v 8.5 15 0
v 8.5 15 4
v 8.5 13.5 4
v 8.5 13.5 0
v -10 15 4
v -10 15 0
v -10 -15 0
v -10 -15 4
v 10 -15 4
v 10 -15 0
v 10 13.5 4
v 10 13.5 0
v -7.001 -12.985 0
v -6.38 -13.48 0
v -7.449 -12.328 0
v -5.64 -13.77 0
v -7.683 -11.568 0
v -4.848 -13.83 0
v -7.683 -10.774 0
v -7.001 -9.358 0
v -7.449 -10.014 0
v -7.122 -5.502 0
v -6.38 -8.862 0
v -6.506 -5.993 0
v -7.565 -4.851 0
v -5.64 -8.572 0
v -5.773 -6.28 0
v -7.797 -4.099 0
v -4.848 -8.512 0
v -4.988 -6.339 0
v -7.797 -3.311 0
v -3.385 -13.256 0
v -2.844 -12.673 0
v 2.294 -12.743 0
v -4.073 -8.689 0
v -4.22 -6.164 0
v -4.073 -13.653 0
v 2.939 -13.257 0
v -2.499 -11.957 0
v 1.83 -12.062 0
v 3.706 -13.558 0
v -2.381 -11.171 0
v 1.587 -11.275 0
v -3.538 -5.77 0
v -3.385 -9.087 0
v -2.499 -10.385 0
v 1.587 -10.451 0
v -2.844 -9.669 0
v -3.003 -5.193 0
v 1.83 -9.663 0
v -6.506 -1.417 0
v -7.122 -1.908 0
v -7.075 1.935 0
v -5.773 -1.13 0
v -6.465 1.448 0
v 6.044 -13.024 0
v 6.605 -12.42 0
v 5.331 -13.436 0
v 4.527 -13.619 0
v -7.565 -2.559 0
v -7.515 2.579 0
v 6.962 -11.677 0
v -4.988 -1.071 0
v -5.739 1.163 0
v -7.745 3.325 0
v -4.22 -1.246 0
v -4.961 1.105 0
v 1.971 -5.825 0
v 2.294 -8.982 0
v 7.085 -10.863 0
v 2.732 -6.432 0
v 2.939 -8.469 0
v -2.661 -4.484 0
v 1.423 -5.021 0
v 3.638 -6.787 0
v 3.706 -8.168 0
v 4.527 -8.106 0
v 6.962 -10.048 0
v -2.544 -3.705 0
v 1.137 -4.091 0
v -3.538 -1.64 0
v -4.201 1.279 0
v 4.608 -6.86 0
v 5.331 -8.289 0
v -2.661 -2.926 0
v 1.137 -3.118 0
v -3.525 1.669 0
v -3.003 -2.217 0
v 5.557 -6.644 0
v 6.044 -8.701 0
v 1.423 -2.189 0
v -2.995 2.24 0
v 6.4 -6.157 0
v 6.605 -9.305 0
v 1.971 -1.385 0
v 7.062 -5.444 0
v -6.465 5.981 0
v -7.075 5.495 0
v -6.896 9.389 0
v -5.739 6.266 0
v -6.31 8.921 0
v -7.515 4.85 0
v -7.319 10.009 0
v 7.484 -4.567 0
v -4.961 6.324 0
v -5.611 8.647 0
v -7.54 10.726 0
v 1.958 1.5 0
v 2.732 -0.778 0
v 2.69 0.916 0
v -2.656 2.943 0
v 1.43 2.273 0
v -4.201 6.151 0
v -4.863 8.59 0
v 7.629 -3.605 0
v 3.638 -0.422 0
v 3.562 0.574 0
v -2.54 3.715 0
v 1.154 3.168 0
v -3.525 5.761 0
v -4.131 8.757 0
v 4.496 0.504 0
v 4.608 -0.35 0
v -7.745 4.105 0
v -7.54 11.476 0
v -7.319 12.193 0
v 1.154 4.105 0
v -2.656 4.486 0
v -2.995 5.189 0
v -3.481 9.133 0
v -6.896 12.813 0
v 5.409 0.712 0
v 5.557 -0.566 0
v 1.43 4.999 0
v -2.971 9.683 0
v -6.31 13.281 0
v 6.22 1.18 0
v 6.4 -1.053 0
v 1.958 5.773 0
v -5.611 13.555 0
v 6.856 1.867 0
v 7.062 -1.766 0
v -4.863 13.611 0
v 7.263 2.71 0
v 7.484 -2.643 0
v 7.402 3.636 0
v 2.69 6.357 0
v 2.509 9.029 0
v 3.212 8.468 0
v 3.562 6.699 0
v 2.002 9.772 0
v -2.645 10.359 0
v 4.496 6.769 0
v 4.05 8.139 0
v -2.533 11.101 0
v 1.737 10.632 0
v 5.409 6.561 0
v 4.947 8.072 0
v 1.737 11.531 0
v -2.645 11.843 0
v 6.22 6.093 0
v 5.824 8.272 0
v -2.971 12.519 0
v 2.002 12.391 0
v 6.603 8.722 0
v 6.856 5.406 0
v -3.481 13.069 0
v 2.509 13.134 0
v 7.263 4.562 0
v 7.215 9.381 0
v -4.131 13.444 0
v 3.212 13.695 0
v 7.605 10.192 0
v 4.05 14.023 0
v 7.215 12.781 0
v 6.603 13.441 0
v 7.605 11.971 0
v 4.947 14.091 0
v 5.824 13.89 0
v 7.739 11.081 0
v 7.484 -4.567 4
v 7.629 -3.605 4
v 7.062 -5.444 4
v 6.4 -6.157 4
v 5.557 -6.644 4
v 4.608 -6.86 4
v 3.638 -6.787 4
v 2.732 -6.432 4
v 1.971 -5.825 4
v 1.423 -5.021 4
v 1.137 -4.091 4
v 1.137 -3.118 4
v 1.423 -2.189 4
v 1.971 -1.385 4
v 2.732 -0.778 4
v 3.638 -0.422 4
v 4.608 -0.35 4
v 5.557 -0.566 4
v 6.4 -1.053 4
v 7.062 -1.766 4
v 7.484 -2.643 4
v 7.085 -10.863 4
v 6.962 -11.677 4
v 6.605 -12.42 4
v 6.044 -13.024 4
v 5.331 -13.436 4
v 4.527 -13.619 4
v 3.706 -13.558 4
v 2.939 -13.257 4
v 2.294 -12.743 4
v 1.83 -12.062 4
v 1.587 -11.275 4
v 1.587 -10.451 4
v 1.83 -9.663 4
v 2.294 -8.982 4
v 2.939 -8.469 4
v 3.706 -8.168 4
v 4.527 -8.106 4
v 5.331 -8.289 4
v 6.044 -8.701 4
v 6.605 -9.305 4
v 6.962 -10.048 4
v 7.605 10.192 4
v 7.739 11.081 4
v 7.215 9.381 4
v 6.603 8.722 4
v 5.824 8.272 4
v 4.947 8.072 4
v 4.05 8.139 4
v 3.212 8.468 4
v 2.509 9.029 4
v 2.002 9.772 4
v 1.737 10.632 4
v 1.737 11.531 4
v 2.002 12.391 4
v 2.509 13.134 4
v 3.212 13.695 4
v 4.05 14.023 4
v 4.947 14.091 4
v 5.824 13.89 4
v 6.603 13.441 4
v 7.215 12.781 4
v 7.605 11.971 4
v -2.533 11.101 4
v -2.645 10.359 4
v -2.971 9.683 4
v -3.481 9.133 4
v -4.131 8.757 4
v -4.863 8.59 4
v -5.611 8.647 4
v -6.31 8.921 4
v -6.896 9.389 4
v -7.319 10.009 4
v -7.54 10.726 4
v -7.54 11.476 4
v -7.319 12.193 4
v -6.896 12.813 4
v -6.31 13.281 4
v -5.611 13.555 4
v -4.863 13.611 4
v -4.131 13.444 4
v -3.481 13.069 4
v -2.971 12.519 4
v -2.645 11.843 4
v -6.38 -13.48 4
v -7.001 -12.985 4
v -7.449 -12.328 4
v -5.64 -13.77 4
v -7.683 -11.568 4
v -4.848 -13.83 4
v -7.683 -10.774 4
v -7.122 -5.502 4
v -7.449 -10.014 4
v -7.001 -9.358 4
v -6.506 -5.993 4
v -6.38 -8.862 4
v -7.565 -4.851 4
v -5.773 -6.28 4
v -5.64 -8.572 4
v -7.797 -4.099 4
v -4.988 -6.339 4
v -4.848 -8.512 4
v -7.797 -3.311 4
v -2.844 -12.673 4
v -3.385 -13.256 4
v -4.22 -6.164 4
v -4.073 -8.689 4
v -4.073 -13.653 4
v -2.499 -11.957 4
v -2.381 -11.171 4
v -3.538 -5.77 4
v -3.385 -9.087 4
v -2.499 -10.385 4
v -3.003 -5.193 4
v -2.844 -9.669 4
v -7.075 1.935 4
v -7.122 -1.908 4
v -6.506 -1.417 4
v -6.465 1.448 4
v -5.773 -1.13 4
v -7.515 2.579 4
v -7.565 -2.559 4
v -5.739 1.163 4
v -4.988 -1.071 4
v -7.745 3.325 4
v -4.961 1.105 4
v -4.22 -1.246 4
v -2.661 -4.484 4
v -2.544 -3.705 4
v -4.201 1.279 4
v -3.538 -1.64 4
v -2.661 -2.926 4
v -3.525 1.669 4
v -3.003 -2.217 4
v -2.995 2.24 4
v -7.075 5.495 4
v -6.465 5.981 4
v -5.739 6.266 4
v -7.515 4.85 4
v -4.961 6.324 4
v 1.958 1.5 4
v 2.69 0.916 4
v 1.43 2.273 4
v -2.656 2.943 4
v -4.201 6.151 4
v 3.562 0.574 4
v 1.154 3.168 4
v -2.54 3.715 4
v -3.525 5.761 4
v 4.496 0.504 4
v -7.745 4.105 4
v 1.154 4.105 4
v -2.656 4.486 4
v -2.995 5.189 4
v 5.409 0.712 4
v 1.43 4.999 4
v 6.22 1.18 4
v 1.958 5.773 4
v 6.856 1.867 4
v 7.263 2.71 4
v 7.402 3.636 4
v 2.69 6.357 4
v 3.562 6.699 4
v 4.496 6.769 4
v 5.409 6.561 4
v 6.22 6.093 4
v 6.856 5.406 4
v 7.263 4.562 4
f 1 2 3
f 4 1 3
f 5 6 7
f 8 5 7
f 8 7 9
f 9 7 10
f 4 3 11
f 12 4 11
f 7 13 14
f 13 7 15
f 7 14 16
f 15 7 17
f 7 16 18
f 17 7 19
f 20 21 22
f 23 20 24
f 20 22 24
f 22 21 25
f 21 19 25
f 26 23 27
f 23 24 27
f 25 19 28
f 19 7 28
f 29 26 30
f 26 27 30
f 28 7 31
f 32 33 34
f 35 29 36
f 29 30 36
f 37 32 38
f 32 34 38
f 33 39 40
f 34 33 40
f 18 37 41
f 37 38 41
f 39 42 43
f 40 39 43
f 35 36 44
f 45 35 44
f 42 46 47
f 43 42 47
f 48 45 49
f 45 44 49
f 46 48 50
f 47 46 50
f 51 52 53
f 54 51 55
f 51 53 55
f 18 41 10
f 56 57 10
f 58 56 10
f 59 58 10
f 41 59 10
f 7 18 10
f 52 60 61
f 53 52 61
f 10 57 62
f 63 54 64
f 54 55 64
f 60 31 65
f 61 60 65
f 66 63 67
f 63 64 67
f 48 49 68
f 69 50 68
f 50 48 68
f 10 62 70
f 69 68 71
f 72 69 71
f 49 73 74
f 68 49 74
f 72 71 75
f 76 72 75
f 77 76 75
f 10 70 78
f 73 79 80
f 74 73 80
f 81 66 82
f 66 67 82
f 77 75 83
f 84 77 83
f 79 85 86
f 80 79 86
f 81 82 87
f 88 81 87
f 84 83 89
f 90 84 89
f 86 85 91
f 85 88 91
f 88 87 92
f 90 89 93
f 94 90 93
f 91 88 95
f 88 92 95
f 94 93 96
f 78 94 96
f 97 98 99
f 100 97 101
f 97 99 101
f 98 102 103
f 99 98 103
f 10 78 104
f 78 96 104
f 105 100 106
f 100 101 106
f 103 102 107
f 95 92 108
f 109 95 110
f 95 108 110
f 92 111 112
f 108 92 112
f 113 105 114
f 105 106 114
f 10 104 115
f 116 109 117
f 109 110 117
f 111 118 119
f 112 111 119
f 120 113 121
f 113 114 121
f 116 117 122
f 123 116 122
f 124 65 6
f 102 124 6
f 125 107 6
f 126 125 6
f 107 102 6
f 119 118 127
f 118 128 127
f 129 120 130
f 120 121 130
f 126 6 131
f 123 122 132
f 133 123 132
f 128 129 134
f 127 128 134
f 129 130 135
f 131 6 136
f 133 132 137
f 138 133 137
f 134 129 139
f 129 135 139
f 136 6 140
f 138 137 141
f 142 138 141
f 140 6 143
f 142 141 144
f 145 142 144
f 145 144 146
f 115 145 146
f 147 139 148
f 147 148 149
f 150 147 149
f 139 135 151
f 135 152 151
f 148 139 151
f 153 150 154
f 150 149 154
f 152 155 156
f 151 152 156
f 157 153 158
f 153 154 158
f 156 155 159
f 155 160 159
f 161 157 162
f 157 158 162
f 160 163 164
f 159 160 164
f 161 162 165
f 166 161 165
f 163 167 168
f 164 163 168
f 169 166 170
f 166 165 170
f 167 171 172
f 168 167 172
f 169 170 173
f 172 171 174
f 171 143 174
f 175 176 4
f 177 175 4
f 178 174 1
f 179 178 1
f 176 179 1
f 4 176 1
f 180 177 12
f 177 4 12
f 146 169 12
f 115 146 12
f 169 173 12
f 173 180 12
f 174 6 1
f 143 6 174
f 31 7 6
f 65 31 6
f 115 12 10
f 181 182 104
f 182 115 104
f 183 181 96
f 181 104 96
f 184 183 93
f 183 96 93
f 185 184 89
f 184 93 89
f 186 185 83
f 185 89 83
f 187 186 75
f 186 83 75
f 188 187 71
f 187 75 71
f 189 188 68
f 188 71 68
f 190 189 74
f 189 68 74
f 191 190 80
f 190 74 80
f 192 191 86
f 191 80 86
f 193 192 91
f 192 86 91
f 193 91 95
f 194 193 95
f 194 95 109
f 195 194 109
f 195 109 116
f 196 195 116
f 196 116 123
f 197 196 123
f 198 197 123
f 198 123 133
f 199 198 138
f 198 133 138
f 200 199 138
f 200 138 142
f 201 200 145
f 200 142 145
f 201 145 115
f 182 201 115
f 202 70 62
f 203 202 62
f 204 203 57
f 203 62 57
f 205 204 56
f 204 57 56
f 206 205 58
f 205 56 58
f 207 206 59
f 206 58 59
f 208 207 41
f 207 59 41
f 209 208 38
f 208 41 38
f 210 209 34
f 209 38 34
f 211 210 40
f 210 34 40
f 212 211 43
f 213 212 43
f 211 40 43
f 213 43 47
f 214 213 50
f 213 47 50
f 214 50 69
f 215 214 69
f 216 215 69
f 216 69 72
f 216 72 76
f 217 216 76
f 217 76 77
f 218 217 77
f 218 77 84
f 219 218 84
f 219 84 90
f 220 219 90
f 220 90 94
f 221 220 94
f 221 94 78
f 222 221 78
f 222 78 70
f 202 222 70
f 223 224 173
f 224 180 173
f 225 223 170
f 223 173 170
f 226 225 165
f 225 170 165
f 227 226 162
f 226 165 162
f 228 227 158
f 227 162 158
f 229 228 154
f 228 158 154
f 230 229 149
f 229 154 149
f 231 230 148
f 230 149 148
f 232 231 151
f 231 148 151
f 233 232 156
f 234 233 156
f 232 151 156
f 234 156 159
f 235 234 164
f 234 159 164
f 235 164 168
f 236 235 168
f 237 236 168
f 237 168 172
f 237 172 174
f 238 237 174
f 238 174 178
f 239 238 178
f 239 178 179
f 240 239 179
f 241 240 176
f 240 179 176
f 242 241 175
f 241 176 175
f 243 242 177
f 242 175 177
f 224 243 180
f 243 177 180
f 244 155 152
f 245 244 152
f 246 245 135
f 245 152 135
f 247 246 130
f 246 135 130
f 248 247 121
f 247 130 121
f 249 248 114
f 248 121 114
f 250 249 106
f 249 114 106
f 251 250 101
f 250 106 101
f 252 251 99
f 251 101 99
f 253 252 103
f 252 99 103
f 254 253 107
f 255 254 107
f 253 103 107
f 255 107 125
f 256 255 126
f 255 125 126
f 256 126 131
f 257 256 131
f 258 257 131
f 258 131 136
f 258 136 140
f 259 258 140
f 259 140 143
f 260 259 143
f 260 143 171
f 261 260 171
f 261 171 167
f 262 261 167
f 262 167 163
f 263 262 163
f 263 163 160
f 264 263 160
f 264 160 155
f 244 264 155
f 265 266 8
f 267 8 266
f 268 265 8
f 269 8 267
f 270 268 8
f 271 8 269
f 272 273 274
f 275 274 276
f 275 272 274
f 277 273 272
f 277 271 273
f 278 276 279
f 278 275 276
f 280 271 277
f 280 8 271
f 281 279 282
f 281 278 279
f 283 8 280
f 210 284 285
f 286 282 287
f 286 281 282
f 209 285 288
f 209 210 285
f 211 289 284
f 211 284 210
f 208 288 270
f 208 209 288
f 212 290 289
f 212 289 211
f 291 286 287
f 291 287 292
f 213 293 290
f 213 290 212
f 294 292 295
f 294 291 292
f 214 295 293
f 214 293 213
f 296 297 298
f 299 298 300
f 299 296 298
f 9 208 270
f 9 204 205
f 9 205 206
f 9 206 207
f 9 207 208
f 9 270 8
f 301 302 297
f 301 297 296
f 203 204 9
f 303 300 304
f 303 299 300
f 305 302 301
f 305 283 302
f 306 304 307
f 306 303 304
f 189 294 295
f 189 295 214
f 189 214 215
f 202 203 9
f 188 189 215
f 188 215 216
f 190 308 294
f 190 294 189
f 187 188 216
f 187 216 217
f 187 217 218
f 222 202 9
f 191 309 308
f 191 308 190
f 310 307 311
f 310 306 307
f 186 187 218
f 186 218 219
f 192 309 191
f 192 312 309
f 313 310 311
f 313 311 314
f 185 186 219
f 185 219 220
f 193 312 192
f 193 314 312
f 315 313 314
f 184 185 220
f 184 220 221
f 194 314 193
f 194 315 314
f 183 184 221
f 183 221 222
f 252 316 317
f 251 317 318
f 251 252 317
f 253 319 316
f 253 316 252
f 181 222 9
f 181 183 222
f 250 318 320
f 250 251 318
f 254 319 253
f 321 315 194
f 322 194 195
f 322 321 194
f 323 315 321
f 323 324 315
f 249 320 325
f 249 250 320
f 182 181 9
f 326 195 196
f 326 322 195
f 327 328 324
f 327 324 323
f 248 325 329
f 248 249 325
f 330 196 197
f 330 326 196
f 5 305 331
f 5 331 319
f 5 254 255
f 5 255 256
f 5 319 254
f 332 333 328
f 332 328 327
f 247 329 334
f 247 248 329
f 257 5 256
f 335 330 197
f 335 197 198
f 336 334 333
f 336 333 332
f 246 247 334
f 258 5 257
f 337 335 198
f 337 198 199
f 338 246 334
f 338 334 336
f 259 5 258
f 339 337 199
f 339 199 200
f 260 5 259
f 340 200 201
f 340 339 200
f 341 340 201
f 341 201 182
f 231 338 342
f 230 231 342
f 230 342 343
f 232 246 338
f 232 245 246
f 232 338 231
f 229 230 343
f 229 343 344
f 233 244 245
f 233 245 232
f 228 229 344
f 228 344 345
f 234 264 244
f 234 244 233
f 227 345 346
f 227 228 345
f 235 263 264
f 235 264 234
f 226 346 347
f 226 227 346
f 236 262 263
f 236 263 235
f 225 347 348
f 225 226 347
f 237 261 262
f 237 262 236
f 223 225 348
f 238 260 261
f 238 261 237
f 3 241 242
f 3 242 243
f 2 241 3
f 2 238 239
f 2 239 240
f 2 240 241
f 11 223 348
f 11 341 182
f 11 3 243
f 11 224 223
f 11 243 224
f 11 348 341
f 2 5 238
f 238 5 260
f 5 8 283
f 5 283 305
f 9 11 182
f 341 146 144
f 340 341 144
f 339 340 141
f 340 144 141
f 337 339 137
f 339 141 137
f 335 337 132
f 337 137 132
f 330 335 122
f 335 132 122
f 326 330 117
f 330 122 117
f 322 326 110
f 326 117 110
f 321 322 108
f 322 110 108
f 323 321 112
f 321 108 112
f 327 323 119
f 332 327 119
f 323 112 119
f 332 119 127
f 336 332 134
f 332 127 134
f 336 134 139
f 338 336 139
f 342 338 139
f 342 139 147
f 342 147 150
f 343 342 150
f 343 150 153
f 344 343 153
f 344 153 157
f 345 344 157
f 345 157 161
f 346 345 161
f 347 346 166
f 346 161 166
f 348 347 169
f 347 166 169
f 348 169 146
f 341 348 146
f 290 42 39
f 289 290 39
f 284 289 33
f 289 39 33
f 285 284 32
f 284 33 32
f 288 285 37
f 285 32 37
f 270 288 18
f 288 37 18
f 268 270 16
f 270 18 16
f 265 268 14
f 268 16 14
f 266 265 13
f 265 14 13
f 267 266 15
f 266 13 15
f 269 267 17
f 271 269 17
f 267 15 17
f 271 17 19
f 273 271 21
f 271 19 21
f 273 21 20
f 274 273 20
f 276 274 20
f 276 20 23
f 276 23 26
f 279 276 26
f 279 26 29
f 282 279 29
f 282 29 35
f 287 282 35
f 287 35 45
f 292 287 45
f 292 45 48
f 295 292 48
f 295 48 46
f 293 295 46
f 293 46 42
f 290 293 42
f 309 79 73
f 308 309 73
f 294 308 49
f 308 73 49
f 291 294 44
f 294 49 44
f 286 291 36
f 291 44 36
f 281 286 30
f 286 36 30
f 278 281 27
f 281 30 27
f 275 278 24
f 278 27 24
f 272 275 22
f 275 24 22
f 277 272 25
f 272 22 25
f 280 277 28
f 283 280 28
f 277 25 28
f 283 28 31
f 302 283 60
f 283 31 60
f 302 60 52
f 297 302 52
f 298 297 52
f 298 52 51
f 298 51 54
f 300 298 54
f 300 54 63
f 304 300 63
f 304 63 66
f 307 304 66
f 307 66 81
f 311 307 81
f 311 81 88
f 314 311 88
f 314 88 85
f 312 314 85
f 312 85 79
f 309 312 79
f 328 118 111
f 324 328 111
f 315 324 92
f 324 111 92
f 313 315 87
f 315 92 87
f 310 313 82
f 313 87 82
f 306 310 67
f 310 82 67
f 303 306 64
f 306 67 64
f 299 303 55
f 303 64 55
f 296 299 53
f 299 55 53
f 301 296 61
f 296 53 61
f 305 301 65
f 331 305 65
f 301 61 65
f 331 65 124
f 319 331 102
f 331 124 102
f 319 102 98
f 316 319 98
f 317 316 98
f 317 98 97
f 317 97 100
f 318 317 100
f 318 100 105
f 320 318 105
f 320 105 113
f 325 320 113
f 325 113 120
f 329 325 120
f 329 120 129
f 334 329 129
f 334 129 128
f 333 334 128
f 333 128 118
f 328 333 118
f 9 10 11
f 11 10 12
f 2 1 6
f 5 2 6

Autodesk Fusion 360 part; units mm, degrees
sketch "Sketch3" plane through (0, 0, 0) normal (0, 0, 1) x (1, 0, 0)
  line L0 (10, 15) -> (-10, 15)
  line L1 (-10, 15) -> (-10, -15)
  line L2 (-10, -15) -> (10, -15)
  line L3 (10, -15) -> (10, 15)
  line L4 (10, 15) -> (-10, -15) construction
  line L5 (-10, 15) -> (10, -15) construction
  circle A0 centre (-5.1854, -3.7051) radius 3.5
  circle A1 centre (4.3644, -3.6049) radius 3.5
  circle A2 centre (-5.0469, -11.1711) radius 3.5
  circle A3 centre (4.3207, -10.8626) radius 3.5
  circle A4 centre (-5.1568, 3.7146) radius 3.5
  circle A5 centre (4.2608, 3.6364) radius 3.5
  circle A6 centre (-5.0509, 11.1009) radius 3.5
  circle A7 centre (4.7212, 11.0813) radius 3.5
  dimension "d22" = 20
  dimension "d23" = 30
  dimension "d24" = 7
  dimension "d25" = 7
  dimension "d26" = 7
  dimension "d27" = 7
  dimension "d34" = 7
  dimension "d35" = 7
  dimension "d36" = 7
  dimension "d37" = 7
extrude "Extrude6" add sketch "Sketch3" along normal blind 4
sketch "Sketch5" plane through (0, 0, 4) normal (0, 0, 1) x (-1, 0, 0)
  circle A0 centre (5.1854, 3.7051) radius 3.5
  circle A1 centre (5.0469, 11.1711) radius 3.5
  circle A2 centre (-4.3644, 3.6049) radius 3.5
  circle A3 centre (-4.3207, 10.8626) radius 3.5
  circle A4 centre (5.1568, -3.7146) radius 3.5
  circle A5 centre (-4.2608, -3.6364) radius 3.5
  circle A6 centre (5.0509, -11.1009) radius 3.5
  circle A7 centre (-4.7212, -11.0813) radius 3.5
  line L0 (-10, 15) -> (-10, -15)
  line L1 (-10, -15) -> (10, -15)
  line L2 (10, -15) -> (10, 15)
  line L3 (10, 15) -> (-10, 15)
  line L4 (-10, -15) -> (-8.5, -15)
  line L5 (-8.5, -15) -> (-8.5, -13.5)
  line L6 (-8.5, -13.5) -> (-10, -13.5)
  line L7 (-10, -13.5) -> (-10, -15)
  dimension "d40" = 1.5
  dimension "d41" = 1.5
extrude "Extrude7" cut sketch "Sketch5" against normal blind 4 contours L0 L1 L4 L5 L6 L7
thread "Thread6" "ISO Metric profile 6.0 M6x1 6H" major diameter 6.147 minor diameter 5.035 pitch 1 angle 60 resizes the face on face at (-1.5553, 10.9264, 2.6667)
thread "Thread7" "ISO Metric profile 6.0 M6x0.8 6H" major diameter 6.1107 minor diameter 5.234 pitch 0.8 angle 60 resizes the face on face at (-1.6611, 3.8891, 1.3333)
thread "Thread8" "ISO Metric profile 6.0 M6x0.75 6H" major diameter 6.1201 minor diameter 5.2831 pitch 0.75 angle 60 resizes the face on face at (-1.6898, -3.5307, 1.3333)
thread "Thread9" "ISO Metric profile 6.0 M6x0.7 6H" major diameter 6.1132 minor diameter 5.3322 pitch 0.7 angle 60 resizes the face on face at (-1.5513, -10.9966, 1.3333)
thread "Thread10" "ISO Metric profile 7.0 M7x1 6H" major diameter 7.1472 minor diameter 6.0355 pitch 1 angle 60 resizes the face on face at (8.2169, 11.2557, 1.3333)
thread "Thread11" "ISO Metric profile 7.0 M7x0.75 6H" major diameter 7.1201 minor diameter 6.2831 pitch 0.75 angle 60 resizes the face on face at (7.7565, 3.8108, 1.3333)
thread "Thread12" "ISO Metric profile 7.0 M7x0.5 6H" major diameter 7.0922 minor diameter 6.5287 pitch 0.5 angle 60 resizes the face on face at (7.86, -3.4304, 1.3333)
thread "Thread13" "ISO Metric profile 6.0 M6x0.5 6H" major diameter 6.0922 minor diameter 5.5287 pitch 0.5 angle 60 resizes the face on face at (7.8163, -10.6881, 1.3333)
